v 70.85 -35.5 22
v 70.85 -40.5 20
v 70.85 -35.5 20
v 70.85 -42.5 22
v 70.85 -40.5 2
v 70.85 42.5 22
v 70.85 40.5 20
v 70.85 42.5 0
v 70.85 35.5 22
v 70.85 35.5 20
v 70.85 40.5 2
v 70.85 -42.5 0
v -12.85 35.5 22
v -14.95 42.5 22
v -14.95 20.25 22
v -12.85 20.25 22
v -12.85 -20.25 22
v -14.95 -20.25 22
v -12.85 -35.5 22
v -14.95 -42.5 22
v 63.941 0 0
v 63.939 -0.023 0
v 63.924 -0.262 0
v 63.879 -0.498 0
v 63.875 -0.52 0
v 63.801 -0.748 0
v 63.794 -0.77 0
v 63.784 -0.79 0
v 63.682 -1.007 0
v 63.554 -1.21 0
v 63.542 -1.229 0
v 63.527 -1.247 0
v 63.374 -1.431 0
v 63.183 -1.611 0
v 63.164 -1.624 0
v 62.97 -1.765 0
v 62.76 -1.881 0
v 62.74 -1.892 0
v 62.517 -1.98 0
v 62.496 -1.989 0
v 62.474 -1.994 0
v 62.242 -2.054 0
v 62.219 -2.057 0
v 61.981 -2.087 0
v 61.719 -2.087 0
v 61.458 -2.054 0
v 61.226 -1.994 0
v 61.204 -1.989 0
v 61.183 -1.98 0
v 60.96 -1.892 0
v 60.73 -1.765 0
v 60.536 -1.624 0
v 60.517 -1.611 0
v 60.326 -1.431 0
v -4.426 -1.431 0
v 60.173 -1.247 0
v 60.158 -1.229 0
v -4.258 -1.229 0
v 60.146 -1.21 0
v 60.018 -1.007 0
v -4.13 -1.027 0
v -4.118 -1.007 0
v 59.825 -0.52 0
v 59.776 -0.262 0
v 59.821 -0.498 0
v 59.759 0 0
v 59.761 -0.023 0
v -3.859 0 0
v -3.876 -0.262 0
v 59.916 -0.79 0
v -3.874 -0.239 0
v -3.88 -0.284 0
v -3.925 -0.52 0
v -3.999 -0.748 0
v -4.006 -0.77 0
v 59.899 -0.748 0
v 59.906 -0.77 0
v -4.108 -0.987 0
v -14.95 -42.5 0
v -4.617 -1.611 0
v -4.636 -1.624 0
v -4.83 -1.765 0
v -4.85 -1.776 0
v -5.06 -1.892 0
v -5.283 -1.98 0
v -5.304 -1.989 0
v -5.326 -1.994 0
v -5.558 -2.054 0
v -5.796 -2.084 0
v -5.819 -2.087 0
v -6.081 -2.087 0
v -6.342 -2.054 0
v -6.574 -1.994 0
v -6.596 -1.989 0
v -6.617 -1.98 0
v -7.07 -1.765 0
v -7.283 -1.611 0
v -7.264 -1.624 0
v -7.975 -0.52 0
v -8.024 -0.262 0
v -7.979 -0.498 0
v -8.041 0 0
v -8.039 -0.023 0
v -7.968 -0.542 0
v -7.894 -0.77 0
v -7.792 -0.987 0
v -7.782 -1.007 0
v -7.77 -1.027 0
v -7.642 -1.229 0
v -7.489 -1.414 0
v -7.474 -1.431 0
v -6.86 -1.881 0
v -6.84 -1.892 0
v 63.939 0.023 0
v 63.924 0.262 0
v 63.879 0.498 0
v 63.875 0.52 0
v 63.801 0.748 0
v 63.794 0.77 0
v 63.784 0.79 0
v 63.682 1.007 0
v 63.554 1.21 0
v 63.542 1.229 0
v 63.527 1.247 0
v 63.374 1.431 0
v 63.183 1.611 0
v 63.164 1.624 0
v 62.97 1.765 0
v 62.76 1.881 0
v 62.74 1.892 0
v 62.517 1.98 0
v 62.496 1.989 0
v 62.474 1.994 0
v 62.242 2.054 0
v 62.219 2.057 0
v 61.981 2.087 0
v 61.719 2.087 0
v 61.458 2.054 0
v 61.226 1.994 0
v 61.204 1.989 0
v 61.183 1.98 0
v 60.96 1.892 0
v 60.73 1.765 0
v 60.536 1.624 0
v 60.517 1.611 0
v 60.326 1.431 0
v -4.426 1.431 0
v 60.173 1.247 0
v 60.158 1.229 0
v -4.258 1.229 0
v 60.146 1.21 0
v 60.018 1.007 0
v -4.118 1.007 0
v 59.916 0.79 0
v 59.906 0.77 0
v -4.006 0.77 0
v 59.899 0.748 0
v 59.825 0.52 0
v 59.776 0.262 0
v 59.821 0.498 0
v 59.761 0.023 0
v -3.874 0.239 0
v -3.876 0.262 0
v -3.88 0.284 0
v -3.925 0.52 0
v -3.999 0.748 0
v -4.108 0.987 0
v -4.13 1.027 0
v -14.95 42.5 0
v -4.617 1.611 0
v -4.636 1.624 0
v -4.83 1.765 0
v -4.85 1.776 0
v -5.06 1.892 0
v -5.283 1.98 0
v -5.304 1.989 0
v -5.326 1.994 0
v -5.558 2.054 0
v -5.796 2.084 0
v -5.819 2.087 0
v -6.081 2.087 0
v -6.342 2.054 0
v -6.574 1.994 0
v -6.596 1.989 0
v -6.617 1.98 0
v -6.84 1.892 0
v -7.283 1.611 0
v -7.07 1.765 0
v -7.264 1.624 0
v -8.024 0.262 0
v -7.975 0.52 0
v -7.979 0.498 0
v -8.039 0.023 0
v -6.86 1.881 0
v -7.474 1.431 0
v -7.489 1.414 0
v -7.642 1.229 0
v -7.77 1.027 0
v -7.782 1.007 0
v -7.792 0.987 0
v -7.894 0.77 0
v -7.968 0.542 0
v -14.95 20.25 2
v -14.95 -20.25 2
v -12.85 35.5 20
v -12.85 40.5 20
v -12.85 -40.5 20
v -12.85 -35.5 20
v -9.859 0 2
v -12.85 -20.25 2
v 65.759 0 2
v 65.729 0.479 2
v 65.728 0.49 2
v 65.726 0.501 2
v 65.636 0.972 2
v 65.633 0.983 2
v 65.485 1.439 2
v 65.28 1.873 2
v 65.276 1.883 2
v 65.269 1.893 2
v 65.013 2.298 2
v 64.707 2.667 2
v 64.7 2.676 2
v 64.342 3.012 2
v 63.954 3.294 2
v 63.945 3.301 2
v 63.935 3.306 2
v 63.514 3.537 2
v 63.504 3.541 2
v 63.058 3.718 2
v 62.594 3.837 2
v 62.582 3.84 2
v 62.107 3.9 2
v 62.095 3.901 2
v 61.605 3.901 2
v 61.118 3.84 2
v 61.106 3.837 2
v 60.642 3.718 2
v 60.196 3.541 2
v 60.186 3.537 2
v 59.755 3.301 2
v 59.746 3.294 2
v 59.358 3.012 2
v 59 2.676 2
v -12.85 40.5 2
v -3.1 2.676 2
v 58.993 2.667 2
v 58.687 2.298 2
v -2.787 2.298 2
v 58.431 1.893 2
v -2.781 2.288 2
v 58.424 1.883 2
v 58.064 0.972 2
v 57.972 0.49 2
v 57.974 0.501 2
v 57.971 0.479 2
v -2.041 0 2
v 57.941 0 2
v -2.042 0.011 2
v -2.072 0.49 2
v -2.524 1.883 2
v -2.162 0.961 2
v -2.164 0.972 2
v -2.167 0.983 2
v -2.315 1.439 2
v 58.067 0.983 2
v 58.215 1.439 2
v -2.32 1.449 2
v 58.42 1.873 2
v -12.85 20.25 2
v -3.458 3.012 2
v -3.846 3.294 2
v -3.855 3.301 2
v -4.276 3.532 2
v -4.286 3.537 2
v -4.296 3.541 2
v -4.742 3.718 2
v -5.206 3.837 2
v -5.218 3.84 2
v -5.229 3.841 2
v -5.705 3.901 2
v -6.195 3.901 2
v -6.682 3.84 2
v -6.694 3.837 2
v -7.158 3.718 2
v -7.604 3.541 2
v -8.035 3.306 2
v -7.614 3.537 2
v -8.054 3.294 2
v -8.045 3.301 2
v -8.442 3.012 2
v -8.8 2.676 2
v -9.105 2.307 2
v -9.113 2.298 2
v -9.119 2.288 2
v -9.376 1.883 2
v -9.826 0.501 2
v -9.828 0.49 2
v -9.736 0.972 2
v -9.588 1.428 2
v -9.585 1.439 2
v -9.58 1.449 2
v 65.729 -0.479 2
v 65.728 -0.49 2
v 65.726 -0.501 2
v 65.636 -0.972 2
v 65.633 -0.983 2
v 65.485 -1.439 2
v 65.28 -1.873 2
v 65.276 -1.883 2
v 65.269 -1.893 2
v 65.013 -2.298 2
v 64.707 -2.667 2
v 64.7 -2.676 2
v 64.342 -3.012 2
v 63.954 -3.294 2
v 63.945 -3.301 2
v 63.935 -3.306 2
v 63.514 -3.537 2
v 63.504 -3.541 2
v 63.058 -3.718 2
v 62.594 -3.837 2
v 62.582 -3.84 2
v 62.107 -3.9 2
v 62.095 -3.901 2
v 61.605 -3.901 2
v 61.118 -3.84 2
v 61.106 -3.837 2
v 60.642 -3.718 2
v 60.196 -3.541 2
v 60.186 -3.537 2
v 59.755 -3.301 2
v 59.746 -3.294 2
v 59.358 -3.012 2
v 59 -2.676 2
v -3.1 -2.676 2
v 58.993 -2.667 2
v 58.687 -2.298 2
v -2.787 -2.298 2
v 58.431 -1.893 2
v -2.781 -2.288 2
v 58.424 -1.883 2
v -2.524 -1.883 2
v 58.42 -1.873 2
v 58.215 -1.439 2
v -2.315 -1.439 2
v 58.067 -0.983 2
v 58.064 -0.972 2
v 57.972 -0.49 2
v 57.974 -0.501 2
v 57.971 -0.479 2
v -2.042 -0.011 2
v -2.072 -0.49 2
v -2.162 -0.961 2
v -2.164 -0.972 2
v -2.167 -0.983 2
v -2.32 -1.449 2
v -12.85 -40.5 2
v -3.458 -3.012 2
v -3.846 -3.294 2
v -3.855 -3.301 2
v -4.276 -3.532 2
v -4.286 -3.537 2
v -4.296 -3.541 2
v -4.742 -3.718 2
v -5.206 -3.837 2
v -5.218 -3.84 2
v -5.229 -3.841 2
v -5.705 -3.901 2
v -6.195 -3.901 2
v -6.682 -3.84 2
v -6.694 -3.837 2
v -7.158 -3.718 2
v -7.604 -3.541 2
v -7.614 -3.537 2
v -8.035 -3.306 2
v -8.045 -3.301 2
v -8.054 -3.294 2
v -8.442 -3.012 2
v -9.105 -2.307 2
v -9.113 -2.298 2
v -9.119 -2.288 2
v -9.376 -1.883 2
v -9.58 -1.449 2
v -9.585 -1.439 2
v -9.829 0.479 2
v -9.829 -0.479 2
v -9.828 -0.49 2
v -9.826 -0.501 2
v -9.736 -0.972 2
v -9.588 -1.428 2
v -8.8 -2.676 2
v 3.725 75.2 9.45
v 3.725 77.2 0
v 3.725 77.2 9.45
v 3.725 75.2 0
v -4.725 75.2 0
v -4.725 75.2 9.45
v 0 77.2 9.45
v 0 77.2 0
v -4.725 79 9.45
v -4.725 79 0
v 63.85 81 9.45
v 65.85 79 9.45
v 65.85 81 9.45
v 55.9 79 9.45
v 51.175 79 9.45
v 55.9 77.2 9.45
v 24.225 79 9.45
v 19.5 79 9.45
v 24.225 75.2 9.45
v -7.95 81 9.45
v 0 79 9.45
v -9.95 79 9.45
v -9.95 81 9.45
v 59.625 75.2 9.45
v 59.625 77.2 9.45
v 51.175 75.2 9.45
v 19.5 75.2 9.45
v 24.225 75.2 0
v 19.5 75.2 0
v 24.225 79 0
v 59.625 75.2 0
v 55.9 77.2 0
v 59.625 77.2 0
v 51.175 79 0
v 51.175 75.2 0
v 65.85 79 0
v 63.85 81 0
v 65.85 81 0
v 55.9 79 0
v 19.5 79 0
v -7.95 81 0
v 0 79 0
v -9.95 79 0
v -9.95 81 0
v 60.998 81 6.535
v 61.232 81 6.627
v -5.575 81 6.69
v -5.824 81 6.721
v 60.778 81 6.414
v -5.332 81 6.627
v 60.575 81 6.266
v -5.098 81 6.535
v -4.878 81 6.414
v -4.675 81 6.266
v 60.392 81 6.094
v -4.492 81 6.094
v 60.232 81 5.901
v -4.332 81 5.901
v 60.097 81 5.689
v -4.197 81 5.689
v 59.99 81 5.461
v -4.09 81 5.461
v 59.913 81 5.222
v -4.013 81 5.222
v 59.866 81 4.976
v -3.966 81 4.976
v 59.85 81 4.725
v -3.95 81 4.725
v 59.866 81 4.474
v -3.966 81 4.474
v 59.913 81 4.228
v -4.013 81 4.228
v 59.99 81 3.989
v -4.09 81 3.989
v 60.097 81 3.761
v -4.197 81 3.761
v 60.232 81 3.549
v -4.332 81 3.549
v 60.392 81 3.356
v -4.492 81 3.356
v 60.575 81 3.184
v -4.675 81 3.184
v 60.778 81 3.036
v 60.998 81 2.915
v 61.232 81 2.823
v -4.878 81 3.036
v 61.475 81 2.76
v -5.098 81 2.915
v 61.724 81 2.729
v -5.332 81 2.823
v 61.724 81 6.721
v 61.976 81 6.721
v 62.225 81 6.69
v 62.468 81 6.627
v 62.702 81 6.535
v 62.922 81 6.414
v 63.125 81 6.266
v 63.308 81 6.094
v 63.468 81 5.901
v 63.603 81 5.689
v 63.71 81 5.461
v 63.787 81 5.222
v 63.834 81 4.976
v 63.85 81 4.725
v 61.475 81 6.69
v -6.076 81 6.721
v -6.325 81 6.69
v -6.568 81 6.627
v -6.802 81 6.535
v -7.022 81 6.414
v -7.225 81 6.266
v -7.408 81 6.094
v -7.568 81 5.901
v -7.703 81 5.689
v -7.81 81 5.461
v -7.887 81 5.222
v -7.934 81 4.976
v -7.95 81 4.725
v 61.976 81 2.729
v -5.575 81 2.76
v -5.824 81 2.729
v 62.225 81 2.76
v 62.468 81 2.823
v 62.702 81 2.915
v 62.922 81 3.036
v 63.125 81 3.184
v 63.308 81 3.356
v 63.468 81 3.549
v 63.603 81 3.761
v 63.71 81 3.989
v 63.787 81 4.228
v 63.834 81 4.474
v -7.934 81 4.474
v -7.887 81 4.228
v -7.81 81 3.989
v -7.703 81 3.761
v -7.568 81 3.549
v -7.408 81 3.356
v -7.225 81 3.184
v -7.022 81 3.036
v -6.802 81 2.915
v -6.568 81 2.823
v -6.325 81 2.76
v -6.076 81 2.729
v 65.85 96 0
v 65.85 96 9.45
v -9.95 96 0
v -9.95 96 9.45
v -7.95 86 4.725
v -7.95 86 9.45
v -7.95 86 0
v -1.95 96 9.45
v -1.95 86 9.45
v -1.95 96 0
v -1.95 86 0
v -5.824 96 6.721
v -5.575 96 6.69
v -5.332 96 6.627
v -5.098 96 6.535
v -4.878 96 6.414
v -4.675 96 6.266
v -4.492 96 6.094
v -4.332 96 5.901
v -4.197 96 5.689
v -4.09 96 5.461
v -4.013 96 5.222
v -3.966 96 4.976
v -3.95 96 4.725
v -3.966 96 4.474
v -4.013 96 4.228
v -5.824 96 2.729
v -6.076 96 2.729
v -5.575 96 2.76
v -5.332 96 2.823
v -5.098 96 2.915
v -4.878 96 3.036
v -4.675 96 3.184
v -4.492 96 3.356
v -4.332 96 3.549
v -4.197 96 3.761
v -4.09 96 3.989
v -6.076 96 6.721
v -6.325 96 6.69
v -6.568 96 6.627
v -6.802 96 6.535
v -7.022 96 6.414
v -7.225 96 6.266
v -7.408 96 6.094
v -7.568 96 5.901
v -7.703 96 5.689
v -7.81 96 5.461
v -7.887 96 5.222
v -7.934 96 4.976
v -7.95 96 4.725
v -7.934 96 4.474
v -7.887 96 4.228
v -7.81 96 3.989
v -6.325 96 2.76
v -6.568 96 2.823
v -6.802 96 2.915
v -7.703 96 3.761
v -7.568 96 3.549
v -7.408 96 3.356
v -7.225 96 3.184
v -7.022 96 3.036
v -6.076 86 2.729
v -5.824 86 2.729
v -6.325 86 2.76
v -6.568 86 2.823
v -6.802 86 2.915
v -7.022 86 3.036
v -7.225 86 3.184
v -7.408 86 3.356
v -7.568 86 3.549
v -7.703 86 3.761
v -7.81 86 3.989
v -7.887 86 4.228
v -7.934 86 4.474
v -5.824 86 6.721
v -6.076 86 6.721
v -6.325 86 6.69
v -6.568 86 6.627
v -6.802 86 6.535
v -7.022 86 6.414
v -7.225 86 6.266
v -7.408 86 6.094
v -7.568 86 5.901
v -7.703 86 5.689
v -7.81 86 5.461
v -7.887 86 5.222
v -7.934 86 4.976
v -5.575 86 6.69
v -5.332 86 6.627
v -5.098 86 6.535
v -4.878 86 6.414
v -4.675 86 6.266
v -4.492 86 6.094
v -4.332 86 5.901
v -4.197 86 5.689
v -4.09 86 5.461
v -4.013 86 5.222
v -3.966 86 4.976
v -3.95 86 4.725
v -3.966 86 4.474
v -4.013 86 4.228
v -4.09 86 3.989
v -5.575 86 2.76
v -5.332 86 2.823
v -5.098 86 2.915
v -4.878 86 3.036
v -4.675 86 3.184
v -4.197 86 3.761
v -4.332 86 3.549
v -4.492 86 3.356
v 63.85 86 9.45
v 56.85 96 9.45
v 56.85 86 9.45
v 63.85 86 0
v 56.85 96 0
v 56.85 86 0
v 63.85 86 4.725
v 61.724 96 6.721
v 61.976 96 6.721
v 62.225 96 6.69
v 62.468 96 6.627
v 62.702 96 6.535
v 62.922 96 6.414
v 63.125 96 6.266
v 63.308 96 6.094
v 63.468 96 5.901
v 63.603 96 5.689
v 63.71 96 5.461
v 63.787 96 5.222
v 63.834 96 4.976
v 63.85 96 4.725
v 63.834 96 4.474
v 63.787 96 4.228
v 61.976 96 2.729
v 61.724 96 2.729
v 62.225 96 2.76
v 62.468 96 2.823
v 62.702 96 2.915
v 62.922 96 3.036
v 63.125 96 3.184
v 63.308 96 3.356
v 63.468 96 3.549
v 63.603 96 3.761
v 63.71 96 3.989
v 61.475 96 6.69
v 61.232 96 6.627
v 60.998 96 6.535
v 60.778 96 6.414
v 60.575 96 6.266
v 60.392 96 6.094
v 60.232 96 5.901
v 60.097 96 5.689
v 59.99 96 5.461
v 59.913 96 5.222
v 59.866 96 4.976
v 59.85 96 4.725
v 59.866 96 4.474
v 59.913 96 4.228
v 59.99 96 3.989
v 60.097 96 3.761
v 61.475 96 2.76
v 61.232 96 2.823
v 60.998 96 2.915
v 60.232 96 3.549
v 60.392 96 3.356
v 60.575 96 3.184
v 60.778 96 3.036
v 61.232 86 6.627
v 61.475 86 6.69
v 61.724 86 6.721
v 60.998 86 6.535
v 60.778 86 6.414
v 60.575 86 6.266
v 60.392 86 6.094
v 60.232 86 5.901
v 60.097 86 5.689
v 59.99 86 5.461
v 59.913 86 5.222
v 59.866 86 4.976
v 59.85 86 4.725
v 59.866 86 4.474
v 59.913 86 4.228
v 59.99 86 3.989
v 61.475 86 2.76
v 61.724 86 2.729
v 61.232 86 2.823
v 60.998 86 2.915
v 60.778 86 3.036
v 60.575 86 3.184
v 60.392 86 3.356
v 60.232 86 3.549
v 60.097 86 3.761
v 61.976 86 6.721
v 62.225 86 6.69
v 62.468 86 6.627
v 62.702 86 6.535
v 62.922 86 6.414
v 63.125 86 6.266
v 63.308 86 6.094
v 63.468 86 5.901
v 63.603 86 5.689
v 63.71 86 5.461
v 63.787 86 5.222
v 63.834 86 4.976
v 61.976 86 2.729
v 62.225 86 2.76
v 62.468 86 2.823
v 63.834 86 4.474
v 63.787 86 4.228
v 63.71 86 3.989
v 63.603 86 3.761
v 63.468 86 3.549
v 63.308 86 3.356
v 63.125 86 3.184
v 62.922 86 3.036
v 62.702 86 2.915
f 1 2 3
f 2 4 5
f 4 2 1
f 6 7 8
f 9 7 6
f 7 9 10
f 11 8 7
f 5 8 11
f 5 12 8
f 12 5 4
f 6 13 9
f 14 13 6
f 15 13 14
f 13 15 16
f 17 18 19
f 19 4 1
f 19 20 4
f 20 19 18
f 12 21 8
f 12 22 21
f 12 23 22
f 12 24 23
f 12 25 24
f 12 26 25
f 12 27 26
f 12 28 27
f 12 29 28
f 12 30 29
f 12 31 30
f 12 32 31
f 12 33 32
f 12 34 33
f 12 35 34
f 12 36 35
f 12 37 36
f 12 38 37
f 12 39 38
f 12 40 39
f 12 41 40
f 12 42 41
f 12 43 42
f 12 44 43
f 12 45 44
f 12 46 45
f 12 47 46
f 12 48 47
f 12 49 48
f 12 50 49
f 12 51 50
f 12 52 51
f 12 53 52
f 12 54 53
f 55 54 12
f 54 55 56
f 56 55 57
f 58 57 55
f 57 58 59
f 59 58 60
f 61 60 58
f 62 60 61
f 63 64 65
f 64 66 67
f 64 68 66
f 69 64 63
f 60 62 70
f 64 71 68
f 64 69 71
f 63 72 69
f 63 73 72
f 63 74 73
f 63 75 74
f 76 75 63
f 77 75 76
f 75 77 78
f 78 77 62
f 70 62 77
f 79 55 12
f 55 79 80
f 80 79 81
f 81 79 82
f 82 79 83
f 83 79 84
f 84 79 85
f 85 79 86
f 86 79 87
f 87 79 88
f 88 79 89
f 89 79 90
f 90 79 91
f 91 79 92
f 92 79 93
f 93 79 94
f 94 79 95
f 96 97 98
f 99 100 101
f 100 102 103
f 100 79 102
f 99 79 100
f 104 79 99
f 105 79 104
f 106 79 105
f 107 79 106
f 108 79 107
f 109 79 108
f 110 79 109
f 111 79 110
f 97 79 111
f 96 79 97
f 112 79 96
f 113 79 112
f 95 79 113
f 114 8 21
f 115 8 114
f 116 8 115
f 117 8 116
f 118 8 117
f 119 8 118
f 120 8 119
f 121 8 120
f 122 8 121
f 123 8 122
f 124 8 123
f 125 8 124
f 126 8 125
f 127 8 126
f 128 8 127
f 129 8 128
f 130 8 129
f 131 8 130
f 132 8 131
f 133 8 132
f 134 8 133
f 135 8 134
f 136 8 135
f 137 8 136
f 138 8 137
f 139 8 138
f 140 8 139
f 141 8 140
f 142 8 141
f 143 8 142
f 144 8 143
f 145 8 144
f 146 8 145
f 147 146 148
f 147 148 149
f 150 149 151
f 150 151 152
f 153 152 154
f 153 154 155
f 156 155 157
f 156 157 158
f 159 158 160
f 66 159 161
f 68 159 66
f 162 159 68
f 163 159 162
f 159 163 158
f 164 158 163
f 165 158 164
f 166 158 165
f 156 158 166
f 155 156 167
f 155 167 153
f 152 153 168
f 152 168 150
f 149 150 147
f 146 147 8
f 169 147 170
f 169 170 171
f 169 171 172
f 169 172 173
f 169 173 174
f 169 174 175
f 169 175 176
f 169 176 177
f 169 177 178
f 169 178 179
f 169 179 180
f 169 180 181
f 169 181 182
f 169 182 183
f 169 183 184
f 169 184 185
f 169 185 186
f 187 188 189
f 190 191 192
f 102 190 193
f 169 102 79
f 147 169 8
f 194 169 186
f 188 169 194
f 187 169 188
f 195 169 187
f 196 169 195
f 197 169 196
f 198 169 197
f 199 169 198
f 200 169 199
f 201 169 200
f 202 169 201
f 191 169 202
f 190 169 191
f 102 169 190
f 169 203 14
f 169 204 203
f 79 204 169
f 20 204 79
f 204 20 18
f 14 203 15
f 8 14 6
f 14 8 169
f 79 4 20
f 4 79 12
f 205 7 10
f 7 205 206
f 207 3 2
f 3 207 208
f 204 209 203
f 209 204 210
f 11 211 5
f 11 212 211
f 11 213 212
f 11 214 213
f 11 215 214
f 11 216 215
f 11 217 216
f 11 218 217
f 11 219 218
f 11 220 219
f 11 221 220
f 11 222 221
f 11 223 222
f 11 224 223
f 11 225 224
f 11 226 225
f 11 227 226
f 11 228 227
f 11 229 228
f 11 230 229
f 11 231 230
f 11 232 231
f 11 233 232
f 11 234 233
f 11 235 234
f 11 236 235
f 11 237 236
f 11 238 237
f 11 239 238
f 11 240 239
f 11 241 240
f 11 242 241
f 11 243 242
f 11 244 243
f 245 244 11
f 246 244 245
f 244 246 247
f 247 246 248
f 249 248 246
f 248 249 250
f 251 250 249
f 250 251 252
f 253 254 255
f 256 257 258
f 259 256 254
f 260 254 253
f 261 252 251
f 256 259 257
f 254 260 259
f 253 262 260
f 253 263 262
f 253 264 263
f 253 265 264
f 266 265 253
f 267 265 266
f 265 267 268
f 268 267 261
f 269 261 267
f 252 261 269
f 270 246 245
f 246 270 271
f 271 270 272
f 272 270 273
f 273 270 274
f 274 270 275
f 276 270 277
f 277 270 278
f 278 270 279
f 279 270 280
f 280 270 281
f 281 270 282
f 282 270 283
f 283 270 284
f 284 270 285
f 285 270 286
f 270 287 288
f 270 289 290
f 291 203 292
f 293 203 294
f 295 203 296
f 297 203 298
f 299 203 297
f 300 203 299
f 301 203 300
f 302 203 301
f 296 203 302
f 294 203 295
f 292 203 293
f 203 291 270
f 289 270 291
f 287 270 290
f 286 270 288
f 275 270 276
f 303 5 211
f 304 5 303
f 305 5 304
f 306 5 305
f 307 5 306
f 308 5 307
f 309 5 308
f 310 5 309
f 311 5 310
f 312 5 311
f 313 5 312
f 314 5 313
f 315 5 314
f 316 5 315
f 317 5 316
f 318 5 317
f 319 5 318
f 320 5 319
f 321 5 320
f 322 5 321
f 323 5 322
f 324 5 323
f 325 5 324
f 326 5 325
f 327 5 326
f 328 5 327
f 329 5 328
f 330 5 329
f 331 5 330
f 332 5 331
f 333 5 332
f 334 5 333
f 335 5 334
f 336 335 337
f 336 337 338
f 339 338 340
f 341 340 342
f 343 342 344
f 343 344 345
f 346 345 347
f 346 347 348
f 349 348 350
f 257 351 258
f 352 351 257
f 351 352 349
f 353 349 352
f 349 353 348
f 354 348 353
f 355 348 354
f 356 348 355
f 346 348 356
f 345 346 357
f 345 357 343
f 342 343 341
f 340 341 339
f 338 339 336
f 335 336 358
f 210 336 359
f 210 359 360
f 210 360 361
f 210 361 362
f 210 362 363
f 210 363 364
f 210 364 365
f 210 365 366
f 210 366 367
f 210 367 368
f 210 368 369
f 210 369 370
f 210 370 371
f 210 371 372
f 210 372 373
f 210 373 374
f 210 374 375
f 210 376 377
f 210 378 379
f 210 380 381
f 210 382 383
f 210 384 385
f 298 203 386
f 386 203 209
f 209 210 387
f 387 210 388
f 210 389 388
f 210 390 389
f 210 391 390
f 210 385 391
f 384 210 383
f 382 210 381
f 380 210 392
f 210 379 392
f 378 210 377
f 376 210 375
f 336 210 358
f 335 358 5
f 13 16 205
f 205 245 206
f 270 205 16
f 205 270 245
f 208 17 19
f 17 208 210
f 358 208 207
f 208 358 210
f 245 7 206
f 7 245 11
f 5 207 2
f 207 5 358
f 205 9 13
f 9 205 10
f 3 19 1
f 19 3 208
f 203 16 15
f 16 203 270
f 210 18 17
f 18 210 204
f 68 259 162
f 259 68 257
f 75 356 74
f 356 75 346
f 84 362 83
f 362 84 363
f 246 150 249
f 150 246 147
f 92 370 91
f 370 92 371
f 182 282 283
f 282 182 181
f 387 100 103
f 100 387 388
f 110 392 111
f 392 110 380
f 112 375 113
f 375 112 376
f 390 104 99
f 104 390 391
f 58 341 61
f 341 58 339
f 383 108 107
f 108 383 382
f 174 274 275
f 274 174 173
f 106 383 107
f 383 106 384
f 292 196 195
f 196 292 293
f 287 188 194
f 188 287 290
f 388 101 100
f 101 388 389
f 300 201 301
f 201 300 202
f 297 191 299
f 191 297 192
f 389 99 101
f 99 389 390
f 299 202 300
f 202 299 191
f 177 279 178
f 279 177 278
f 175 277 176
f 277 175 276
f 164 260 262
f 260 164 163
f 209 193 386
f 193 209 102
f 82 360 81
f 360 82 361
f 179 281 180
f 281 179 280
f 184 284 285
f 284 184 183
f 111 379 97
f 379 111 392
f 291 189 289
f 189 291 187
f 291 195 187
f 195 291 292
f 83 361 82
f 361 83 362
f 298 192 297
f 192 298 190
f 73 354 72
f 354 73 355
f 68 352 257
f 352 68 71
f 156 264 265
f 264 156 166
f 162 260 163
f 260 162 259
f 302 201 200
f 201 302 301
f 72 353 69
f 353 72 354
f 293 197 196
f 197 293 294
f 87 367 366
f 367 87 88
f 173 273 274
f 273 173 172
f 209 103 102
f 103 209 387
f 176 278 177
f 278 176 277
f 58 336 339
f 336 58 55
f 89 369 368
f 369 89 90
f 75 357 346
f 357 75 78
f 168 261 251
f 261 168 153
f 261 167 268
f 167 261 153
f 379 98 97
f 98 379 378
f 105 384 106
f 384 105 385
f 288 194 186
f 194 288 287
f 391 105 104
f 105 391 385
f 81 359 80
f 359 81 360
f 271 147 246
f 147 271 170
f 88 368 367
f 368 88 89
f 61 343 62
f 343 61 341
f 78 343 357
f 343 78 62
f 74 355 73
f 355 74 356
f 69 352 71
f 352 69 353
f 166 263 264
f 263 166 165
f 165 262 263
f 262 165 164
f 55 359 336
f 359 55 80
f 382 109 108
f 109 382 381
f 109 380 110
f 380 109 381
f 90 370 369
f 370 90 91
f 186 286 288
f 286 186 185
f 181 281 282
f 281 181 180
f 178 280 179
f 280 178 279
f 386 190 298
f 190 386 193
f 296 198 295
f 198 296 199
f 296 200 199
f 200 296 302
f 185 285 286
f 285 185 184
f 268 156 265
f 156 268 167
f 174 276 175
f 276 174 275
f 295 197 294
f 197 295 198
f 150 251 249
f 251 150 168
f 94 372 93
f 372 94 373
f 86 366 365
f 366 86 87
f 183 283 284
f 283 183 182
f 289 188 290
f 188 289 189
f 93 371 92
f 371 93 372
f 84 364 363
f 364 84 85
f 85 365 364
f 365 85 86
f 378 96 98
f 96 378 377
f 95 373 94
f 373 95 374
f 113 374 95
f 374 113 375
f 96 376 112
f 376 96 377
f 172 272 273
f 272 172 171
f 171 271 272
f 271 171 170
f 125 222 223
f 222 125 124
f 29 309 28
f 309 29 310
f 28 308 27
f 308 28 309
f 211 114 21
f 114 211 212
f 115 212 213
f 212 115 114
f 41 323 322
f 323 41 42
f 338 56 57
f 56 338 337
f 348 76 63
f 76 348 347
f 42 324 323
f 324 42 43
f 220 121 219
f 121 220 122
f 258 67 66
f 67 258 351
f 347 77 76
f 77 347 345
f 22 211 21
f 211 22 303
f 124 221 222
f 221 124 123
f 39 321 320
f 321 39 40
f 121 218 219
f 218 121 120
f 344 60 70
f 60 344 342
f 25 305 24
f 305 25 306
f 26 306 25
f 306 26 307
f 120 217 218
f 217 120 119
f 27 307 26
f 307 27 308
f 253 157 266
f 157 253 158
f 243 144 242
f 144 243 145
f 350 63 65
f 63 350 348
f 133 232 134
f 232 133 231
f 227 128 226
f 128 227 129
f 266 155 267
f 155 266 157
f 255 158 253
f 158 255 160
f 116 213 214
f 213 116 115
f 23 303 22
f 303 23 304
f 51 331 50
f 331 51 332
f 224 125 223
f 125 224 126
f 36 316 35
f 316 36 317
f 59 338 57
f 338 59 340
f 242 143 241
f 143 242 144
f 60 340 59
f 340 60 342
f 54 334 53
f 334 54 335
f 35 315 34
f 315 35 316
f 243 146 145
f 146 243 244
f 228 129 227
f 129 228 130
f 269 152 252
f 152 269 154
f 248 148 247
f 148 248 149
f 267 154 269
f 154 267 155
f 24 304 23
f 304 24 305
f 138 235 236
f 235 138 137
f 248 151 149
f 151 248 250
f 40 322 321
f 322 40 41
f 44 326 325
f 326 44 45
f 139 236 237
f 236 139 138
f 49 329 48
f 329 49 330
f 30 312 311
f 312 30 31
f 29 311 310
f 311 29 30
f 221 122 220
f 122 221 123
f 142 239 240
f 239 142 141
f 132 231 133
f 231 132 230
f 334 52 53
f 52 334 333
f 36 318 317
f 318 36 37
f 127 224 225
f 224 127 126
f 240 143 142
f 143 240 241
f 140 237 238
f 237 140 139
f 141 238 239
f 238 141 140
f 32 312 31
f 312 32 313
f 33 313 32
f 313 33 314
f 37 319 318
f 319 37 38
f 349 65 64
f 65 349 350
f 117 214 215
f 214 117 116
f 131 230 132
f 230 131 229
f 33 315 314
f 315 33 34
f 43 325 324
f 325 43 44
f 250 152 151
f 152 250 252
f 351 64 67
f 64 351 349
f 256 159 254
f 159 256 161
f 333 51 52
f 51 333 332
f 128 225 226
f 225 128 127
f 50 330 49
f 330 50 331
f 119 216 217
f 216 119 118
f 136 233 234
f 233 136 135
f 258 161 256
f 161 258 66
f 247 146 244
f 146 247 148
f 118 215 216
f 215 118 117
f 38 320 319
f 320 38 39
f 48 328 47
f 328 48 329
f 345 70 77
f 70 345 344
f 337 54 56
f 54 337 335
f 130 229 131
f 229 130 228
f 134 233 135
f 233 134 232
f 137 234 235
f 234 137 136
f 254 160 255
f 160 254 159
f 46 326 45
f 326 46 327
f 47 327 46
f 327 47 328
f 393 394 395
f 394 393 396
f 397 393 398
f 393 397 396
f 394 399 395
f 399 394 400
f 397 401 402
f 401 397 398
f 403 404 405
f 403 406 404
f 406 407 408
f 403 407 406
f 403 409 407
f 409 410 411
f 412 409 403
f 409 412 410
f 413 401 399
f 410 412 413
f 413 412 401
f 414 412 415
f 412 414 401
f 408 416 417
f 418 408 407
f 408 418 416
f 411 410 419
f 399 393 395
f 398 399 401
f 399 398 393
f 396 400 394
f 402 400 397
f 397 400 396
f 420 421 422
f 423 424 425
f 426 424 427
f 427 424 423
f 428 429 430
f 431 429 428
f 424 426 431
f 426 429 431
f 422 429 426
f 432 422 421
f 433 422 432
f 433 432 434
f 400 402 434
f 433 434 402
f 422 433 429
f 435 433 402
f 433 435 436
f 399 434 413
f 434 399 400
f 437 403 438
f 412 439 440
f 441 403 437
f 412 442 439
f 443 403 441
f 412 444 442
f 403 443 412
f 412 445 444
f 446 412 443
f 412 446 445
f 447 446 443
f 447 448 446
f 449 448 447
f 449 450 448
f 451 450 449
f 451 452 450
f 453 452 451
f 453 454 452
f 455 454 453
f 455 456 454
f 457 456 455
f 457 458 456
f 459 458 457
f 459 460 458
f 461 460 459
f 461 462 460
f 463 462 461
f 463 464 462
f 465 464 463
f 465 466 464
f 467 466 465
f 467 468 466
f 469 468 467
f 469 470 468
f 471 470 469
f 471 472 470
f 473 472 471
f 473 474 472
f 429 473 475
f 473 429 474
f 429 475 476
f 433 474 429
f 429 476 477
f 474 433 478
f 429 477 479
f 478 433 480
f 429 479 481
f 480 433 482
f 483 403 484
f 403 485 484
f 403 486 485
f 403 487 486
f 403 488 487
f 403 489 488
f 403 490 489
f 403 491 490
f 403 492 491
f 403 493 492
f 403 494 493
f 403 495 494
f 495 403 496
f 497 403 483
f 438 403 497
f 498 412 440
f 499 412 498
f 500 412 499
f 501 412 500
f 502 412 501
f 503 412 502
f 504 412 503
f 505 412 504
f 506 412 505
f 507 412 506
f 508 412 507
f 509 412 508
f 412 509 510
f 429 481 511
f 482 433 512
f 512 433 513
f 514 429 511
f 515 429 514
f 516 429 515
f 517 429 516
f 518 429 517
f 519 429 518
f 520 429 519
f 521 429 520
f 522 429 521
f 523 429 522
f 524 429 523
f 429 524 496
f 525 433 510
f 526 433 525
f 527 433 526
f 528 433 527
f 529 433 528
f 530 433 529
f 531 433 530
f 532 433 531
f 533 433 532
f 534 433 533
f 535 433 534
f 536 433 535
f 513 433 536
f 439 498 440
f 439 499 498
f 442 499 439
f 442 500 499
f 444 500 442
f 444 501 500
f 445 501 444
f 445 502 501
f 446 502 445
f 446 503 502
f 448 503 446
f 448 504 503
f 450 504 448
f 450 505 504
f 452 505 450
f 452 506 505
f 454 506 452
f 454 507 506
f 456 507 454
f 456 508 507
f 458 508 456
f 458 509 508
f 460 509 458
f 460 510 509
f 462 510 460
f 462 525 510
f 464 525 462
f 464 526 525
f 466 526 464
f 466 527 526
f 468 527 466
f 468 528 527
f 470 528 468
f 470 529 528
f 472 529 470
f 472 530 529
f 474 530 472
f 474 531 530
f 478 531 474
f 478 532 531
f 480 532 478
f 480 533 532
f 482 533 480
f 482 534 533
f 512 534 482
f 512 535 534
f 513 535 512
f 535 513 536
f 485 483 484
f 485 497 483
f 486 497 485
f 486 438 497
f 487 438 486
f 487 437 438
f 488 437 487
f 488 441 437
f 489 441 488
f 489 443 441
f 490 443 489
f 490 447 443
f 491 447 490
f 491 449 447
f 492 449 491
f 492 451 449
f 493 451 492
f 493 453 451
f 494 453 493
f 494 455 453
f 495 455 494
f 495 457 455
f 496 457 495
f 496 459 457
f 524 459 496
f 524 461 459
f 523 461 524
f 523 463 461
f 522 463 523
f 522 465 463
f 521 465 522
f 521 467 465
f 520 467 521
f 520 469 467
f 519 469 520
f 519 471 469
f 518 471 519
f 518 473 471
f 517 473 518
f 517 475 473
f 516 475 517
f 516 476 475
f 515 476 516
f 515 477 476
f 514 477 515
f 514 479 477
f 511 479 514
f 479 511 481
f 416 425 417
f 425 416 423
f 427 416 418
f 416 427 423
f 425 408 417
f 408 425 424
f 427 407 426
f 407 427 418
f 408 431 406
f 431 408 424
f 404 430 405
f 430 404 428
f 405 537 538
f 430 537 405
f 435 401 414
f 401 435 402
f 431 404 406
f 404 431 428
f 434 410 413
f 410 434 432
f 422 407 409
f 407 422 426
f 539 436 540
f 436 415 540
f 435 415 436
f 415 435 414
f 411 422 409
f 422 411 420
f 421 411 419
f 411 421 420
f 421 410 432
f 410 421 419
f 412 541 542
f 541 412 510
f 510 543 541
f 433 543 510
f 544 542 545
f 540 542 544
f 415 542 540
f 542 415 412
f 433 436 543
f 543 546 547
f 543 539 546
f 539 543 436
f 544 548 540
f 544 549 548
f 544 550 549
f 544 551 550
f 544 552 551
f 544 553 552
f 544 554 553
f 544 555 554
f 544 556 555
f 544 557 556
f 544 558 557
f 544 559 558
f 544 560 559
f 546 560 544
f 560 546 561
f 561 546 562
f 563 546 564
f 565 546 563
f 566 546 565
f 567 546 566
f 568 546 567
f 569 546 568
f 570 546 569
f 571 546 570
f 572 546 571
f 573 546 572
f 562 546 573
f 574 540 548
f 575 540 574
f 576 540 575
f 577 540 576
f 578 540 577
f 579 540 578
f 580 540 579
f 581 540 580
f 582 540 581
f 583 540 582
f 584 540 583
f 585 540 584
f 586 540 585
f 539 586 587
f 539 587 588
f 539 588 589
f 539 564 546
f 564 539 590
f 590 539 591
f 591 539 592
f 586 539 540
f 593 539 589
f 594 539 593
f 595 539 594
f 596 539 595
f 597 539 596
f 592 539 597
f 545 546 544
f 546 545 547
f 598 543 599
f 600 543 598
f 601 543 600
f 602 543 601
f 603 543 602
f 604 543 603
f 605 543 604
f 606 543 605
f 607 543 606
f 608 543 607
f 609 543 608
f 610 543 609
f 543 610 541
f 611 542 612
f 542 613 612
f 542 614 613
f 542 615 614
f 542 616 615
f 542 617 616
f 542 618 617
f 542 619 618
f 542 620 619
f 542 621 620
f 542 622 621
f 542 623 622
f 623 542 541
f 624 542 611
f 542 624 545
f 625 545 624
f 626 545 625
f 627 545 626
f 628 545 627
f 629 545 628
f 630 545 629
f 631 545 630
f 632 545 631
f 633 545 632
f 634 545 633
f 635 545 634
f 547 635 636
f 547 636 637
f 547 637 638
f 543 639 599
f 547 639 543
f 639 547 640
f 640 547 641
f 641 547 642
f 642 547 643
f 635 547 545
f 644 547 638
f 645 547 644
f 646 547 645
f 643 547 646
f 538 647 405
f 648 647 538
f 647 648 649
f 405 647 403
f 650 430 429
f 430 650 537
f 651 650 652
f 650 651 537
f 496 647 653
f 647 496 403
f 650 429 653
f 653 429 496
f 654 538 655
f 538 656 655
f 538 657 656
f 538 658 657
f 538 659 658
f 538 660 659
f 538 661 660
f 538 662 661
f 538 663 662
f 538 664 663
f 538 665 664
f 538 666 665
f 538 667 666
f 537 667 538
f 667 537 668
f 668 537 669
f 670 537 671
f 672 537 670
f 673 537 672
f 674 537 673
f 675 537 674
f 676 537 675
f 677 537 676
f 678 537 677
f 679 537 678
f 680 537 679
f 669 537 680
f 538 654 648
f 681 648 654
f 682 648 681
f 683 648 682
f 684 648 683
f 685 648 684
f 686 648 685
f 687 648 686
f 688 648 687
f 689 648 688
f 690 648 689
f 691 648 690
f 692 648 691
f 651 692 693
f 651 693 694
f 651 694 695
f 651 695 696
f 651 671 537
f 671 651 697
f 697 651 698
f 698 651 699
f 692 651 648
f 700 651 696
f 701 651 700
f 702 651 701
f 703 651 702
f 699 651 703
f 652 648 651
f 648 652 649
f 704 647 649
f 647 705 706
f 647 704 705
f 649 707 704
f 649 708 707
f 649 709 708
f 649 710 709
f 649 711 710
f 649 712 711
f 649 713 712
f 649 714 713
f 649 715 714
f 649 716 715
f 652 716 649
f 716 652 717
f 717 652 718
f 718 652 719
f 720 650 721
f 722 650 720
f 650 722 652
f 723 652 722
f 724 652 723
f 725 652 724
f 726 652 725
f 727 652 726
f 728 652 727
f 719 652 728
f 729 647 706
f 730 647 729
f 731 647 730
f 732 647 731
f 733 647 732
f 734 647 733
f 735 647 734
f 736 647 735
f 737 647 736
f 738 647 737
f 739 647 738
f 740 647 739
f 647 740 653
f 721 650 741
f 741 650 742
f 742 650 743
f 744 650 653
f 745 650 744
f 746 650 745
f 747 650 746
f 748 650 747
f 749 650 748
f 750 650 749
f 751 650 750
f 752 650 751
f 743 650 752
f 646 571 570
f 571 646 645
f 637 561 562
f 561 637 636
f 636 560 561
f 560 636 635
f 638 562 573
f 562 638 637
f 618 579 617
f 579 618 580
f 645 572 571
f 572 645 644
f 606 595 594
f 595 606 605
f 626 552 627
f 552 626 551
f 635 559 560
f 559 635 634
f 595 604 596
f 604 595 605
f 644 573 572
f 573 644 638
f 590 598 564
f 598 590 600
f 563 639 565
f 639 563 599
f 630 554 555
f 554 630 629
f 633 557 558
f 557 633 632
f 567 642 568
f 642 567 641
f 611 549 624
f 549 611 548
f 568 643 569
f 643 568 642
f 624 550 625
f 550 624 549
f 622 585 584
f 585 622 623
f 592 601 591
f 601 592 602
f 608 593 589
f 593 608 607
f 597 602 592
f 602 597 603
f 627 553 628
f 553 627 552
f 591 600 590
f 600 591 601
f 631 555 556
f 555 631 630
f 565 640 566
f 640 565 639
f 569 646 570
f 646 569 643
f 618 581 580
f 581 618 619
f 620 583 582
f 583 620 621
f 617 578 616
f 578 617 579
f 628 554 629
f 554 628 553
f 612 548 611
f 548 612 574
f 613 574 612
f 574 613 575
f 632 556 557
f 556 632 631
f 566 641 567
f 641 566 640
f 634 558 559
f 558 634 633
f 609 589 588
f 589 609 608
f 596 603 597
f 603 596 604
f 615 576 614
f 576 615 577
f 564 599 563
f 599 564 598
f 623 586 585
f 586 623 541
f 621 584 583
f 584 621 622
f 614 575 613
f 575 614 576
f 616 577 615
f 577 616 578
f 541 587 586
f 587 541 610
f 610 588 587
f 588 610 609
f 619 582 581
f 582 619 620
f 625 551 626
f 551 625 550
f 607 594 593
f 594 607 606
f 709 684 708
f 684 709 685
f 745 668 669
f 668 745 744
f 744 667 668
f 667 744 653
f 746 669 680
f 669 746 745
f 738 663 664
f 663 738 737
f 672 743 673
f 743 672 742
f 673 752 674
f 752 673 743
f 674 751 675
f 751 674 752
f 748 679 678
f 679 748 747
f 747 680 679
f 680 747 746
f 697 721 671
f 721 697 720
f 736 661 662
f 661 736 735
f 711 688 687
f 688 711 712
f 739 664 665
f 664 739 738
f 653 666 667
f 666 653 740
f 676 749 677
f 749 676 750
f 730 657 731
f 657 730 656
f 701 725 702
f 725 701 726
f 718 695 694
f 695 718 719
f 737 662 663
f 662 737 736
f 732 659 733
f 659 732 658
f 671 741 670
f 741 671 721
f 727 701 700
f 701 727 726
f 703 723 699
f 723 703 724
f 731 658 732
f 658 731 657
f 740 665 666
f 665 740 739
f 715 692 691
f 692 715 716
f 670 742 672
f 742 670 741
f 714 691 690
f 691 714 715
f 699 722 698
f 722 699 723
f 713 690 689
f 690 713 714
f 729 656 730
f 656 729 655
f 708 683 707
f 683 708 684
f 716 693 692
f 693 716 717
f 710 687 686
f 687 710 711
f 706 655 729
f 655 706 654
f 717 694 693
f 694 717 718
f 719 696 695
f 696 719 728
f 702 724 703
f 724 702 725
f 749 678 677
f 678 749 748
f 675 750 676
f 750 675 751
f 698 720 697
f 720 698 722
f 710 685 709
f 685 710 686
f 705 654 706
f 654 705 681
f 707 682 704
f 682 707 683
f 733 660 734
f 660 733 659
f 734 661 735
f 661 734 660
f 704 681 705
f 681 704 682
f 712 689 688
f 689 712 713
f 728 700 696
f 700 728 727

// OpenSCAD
$fn=50;
ts=2;

kv=9.95;//размер ячейкм
kv1=kv-0.5;
dd=18;//растояние между ячейками
tst=1.8;//толщина стенки = сетки
dot=3;//for sanorez
hn=4;//h nogi
dno=kv*1.7;//d fix

mot=15; //длина стоек от стены
smr=4;//диаметр самореза
dsm=10;//длина под саморез

dotv=4.5;
lot=10;
step=30;
coun=3;

dk=kv*1.7;
dv=kv*0.9;


smart=[81,18,10];

sm();
translate([0,smart.x,0])nv();//новый фикстатор

module sm(){
    difference(){
        translate([(dd+kv),0,0])difference(){
            translate([0,0,(smart.y+2*ts)/2])cube([ (dd+kv)*2+kv*2+10,smart.x+2*ts, smart.y+2*ts],true);
            translate([ts+0.1,0,(smart.y+2*ts)/2])cube([ (dd+kv)*2+kv*2+10,smart.x, smart.y],true);
            translate([ts+0.1,0,(smart.y+2*ts)/2+2*ts])cube([ (dd+kv)*2+kv*2+10,smart.x-smart.z, smart.y+4*ts],true);
            translate([ts+0.1,0,(smart.y+2*ts)/2+2*ts])cube([ (dd+kv)*2+kv*2+4*ts+10,smart.x/2, smart.y+4*ts],true);
        }
        translate([-kv+ts+smr/2,0,-0.1])rotate([0,0,0])cylinder(ts+0.2, smr/2, smr/2+ts);
        translate([(dd+kv)*2+kv-ts-smr/2,0,-0.1])rotate([0,0,0])cylinder(ts+0.2, smr/2, smr/2+ts);
}
}




module nv(){
    difference(){
        union(){
            translate([-kv+ts/2,mot/2,kv1/2])cube([ ts,mot, kv1],true);
            translate([-kv+(ts*2+smr)/2,mot-dsm/2,kv1/2])cube([ ts*2+smr,dsm, kv1],true);
            translate([(dd+kv)*2+kv-ts/2,mot/2,kv1/2])cube([ ts,mot, kv1],true);
            translate([(dd+kv)*2+kv-ts/2-(ts*2+smr)/2,mot-dsm/2,kv1/2])cube([ ts*2+smr,dsm, kv1],true);
            translate([0,0,kv1/2])rotate([90,0,0]){
                translate([(dd+kv),0,ts/2])cube([ (dd+kv)*2+kv*2,kv1, ts],true);
                translate([0,0,0])krk();
                translate([dd+kv,0,0])stp();
                translate([(dd+kv)*2,0,0])krk();
            }
        }
        translate([-kv+ts+smr/2,0,kv1/2])rotate([-90,0,0])cylinder(dsm*10+mot, smr/2, smr/2);
        translate([(dd+kv)*2+kv-ts-smr/2,0,kv1/2])rotate([-90,0,0])cylinder(dsm*10+mot, smr/2, smr/2);
    }
}

// ((dd+kv)*2+kv-ts-smr/2)-(-kv+ts+smr/2)

//all1();

module all1(){
    difference(){
        union(){
            translate([0,(dk+3*ts)/2,0])line1();
            translate([0,-(dk+3*ts)/2,0])line1();
        }
        translate([+step/2,0,-1])cylinder(ts*4, smr/2+0.2, smr/2+0.2);
        translate([((dd+kv)*2+kv-ts-smr/2)-(-kv+ts+smr/2)+step/2,0,-1])cylinder(ts*4, smr/2+0.2, smr/2+0.2);
    }
}


//krk();
module krk(){
    translate([-0.5,0,ts/2+ts+tst])cube([ kv1-1,kv1, ts],true);  
    translate([-kv1/4,0,(ts+tst)/2])cube([ kv1/2,kv1, ts+tst],true);   
}

module stp(){
    //translate([0,0,ts/2+ts+tst])cube([ kv1,kv1, ts],true);  
    translate([-kv1/4-kv1/2+1,0,(ts+tst+ts)/2])cube([ kv1/2,kv1, ts+tst+ts],true);   
}


module line1(){
    intersection(){
        difference(){
            union(){
                translate([coun*step/2,0,ts/2])cube([ coun*step+step+step/4,dk+3*ts, ts],true);
                translate([coun*step/2,0,(lot*0.7)/2])cube([ coun*step+step+step/4,ts, lot*0.7],true);
                for (as=[0:1:coun]){
                    translate([as*step,0,0])rotate([0,45,0])cylinder(lot*2, dotv/2+ts, dotv/2+ts);
                }
            }
            for (as=[0:1:coun]){
                translate([as*step,0,0])rotate([0,45,0])translate([0,0,-dotv/2])cylinder(lot*4, dotv/2, dotv/2);
            }
        }
       translate([coun*step/2,0,lot])cube([ 2*(coun*step+step+step/4),(dk+3*ts)*2, lot*2],true); 
    }
}








module fix(){
    difference(){
        union(){
            translate([(dd+kv)/2,0,ts/2])cube([ dd+kv,kv/2, ts],true);
            translate([0,0,ts/2+ts+tst])rotate([0,0,45])cube([ kv-0.2,kv-0.2, ts],true);
            cylinder(ts, dk/2, dk/2);
            translate([0,0,0])cylinder(ts+tst, dv/2, dv/2);
            //translate([0,0,-(ts+hn)+0.1])cylinder((ts+hn), dv/2, dv/2);
            //translate([0,0,-(ts+hn)+0.1-ts])cylinder(ts, dno/2, dno/2);
            translate([dd+kv,0,0]){
                translate([0,0,(2*ts+tst)/2])rotate([0,0,0])cube([ kv-0.2,kv-0.2, 2*ts+tst],true);
                cylinder(ts, dk/2, dk/2);
            }
        }
        translate([0,0,-0.1])cylinder((ts+tst)*2, dot/2, dot/2);
    }
}
//line();
module all(){
    //difference(){
        line();
    //    translate([-step/2-ts*3,0,kv])rotate([0,-90,0])minus();
    //}
    translate([-step+2*ts+ts/2,0,ts+dk/2])rotate([0,-90,0])fix();
}    
    
    
module minus(){
    translate([0,0,(2*ts+tst)/2])rotate([0,0,0])cube([ kv-0.2,kv-0.2, 2*ts+tst],true);
    translate([dd+kv,0,(2*ts+tst)/2])rotate([0,0,0])cube([ kv-0.2,kv-0.2, 2*ts+tst],true);
}


module line(){
    difference(){
        union(){
            translate([coun*step/2-step/4,0,ts/2])cube([ coun*step+step+step/4,dk+3*ts, ts],true);
            translate([0,(dk+3*ts)/2-ts/2,(dd+kv/2)/2])cube([ step*2-step/4,ts, (dd+kv/2)],true);
            translate([0,-((dk+3*ts)/2-ts/2),(dd+kv/2)/2])cube([ step*2-step/4,ts, (dd+kv/2)],true);
            translate([-step+2*ts,0,(dd*2+kv*1)/2])cube([ ts,dk+3*ts, (dd*2+kv*1)],true);
            translate([coun*step/2,0,lot/2])cube([ coun*step,ts, lot],true);
            for (as=[0:1:coun]){
                translate([as*step,0,0])cylinder(lot, dotv/2+ts, dotv/2+ts);
            }
        }
        for (as=[0:1:coun]){
            translate([as*step,0,-1])cylinder(lot*2, dotv/2, dotv/2);
        }
    }
}
